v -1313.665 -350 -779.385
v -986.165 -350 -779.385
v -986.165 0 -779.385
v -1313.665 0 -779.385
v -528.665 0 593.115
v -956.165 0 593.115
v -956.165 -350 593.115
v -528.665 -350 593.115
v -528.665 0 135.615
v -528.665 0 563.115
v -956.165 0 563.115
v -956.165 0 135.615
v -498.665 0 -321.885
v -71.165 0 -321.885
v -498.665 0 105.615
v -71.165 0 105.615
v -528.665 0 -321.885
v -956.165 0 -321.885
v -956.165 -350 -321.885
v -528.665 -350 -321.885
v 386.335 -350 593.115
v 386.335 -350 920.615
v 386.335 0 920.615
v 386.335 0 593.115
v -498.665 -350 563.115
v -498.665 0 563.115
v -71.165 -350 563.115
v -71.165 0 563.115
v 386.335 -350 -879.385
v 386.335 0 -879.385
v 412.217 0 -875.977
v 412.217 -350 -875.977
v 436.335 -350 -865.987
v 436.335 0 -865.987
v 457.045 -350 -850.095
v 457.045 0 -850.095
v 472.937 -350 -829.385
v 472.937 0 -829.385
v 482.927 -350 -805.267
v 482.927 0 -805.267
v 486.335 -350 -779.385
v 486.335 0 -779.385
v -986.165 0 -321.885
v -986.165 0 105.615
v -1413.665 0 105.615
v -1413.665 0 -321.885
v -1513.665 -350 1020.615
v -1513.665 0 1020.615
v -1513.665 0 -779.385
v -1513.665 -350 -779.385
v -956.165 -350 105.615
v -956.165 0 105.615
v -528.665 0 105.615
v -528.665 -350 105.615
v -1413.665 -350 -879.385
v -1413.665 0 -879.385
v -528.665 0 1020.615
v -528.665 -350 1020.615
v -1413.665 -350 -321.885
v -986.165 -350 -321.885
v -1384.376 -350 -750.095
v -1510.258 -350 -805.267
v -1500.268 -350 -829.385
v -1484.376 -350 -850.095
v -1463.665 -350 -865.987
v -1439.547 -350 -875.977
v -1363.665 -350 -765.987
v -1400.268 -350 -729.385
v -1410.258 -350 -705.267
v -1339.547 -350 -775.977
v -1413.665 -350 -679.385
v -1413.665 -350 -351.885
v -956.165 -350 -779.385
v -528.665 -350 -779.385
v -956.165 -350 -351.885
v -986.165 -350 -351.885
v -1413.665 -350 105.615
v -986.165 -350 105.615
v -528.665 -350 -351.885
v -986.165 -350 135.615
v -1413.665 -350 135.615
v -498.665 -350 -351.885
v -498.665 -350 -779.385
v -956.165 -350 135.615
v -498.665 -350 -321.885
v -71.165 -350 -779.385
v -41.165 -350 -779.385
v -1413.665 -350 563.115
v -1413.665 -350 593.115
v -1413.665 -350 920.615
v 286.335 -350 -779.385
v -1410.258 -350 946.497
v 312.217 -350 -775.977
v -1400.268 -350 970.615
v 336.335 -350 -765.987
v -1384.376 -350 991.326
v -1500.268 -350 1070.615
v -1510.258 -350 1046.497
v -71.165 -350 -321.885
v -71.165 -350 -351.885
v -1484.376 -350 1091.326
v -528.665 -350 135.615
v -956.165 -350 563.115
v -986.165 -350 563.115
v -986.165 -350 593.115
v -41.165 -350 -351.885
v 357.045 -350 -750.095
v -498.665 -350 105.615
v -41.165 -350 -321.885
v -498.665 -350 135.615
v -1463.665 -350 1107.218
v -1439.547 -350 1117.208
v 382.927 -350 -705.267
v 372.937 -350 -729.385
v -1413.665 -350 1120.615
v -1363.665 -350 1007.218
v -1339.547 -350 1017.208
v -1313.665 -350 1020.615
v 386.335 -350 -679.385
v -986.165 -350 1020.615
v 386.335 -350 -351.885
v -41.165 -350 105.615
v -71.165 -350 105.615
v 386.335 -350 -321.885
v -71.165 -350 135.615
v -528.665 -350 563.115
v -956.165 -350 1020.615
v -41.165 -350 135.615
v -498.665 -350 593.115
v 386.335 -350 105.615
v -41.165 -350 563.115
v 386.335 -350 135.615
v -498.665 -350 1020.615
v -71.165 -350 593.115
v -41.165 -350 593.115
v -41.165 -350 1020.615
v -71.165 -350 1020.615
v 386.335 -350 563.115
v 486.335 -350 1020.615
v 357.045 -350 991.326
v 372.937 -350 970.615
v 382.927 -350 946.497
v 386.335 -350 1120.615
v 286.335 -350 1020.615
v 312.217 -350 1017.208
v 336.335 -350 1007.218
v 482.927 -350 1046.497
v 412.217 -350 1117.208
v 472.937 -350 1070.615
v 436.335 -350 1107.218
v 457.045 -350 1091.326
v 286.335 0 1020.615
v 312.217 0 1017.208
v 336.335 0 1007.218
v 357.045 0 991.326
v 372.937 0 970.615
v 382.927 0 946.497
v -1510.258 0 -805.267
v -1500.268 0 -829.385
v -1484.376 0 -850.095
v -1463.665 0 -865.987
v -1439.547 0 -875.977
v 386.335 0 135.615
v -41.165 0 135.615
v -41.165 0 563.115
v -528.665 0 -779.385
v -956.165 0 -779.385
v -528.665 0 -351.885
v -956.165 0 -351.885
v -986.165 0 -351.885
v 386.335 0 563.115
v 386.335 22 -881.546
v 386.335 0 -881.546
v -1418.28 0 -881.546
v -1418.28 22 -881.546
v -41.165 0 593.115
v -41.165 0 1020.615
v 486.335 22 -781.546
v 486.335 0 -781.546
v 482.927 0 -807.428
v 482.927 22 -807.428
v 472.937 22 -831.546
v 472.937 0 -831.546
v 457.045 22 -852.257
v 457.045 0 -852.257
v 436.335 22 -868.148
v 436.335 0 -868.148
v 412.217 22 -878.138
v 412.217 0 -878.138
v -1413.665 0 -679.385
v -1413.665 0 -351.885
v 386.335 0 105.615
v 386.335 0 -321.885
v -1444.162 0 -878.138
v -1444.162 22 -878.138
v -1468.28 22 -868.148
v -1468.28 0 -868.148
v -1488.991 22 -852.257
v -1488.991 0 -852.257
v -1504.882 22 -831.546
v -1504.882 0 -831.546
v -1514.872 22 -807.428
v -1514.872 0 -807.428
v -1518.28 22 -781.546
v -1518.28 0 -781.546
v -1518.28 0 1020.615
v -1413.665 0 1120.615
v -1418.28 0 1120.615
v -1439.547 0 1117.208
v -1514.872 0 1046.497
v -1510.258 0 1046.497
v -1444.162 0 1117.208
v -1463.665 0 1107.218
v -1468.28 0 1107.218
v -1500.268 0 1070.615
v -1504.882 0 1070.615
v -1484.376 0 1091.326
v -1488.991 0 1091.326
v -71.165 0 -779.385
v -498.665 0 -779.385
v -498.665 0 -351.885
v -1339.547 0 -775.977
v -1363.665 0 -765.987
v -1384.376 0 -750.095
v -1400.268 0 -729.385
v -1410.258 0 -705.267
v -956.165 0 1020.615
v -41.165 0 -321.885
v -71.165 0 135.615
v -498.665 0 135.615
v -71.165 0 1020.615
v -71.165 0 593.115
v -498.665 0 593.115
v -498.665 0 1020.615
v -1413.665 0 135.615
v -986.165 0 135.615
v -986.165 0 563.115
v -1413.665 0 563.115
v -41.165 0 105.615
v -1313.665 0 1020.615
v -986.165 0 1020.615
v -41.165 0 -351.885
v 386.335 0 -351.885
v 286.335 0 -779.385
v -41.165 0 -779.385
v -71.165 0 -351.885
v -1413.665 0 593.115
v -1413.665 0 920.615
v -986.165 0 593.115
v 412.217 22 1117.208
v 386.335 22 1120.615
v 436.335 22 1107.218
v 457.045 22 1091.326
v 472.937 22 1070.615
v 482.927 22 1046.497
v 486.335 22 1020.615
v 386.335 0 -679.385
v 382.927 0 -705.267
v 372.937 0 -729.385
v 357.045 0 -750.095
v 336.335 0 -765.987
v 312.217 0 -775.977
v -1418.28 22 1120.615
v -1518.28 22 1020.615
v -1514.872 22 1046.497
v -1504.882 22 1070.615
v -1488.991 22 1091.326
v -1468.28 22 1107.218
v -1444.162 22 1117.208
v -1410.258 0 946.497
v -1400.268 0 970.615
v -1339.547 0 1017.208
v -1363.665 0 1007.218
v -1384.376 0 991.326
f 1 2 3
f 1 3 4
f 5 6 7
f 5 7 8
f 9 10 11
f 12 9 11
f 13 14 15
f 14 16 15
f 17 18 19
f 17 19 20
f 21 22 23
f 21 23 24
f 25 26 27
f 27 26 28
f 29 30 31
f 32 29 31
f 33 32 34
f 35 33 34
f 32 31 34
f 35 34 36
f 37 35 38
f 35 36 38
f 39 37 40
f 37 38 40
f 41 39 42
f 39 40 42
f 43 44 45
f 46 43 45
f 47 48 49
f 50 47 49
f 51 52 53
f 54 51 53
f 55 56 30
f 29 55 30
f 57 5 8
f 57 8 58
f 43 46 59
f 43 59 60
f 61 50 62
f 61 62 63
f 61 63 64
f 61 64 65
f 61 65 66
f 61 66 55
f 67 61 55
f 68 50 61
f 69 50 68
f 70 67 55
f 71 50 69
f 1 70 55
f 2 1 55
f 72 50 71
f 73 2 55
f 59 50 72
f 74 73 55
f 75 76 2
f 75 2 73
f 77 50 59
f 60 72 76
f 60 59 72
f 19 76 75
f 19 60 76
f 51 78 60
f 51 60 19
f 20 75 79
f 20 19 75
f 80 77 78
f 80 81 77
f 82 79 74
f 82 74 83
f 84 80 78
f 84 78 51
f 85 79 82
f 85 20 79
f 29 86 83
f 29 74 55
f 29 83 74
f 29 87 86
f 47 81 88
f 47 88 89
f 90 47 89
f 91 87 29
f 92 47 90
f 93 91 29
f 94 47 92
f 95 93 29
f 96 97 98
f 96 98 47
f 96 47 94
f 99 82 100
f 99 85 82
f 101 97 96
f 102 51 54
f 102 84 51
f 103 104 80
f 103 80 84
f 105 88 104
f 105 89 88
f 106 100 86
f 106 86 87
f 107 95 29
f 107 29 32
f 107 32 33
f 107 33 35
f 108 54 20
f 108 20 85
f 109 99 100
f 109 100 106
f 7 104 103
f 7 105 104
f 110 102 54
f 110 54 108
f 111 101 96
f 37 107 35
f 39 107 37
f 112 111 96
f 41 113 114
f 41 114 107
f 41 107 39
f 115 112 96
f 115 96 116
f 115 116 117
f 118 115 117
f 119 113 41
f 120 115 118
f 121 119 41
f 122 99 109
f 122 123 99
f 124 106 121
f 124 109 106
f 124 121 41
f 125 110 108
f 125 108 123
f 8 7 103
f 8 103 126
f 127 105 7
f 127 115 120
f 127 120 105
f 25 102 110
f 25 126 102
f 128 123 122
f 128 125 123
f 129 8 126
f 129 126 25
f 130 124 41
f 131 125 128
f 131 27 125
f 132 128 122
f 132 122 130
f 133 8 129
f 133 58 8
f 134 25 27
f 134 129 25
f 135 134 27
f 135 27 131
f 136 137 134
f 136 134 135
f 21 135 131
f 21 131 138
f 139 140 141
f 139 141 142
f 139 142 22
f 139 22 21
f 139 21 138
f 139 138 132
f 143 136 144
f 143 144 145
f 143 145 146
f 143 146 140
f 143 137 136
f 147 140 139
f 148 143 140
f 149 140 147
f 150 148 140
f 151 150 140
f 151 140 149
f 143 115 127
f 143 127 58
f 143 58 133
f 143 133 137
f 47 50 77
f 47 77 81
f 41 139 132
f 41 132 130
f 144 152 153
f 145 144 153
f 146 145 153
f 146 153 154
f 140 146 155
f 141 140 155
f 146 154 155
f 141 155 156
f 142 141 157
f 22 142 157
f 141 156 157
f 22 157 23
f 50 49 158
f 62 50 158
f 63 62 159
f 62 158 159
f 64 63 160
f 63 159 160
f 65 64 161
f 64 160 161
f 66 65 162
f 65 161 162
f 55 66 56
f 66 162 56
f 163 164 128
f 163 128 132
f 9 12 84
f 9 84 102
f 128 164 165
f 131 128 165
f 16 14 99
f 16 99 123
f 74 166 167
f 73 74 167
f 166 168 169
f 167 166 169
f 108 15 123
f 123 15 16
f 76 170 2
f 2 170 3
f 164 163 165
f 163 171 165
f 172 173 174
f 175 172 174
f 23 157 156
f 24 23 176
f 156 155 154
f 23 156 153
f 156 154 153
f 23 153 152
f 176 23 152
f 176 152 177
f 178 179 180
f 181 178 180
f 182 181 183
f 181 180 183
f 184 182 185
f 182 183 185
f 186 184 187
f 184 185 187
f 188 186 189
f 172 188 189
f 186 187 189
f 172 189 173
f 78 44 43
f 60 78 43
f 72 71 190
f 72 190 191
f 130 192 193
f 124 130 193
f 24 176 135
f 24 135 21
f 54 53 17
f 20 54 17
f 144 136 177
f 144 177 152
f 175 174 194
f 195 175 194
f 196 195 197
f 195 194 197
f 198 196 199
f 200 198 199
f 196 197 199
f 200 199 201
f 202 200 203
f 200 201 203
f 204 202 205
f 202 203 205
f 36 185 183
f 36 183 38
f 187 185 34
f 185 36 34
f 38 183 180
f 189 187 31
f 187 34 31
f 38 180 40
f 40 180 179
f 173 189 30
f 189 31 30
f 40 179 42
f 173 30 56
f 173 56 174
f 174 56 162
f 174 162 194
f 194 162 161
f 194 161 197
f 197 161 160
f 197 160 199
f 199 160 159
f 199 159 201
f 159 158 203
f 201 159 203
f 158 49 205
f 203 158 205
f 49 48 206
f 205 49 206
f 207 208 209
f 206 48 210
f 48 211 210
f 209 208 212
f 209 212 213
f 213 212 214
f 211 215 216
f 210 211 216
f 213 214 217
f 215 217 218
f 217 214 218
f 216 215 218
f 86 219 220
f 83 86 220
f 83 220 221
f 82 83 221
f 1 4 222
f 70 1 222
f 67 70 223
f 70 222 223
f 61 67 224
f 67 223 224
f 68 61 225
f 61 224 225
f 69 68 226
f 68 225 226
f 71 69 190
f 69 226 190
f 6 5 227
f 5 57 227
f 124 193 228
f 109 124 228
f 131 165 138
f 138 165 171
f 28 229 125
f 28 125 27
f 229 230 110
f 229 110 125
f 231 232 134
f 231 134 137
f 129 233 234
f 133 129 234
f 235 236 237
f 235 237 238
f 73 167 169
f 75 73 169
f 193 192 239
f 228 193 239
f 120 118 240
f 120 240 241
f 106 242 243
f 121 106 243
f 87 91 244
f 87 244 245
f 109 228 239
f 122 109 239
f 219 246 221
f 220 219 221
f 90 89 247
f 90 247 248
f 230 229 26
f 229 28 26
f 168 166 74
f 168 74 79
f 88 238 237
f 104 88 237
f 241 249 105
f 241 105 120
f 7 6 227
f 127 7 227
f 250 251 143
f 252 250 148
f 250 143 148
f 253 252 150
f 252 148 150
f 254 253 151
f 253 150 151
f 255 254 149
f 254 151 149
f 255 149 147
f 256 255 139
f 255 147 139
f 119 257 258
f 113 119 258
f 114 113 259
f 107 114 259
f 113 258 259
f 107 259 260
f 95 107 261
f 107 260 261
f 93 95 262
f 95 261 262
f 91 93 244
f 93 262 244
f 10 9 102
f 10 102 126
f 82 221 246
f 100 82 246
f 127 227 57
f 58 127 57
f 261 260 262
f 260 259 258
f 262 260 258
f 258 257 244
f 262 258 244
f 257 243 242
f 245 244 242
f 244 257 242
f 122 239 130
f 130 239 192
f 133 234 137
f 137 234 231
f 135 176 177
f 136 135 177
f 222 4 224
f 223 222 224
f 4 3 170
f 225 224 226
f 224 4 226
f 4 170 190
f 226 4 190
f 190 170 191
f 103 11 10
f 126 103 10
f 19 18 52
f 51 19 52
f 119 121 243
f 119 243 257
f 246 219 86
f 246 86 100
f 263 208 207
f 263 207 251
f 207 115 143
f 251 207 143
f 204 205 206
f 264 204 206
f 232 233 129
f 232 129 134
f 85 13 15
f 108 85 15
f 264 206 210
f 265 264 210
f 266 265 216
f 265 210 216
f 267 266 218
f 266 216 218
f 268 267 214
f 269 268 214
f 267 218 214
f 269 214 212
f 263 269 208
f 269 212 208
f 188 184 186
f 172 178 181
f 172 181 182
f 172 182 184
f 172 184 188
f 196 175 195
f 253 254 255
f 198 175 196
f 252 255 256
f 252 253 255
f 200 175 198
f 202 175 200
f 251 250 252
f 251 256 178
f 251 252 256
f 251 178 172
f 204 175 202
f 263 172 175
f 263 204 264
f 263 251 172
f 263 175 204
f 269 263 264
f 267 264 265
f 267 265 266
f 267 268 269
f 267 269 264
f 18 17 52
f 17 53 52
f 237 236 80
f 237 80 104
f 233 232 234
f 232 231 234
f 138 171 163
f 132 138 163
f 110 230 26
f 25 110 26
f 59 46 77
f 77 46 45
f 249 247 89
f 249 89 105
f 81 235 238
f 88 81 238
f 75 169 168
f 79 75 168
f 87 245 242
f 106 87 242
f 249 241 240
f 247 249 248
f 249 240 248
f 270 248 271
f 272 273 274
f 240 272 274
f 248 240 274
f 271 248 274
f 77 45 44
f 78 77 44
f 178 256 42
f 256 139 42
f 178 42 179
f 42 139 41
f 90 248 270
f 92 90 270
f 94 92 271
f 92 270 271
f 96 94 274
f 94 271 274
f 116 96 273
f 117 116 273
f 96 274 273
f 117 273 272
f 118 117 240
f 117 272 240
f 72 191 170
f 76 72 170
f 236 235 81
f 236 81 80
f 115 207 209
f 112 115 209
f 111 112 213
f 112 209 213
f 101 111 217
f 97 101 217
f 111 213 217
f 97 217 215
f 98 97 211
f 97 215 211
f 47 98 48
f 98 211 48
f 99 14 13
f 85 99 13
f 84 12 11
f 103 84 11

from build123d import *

# Parameters (mm, degrees)
F0_W     = 427.5
F0_H     = 30
F0_W_2   = 30
F0_H_2   = 427.5
F1_DEPTH = 350
F3_DEPTH = 22


with BuildPart() as f1:
    # F0 (on Front) → F1 (new body)
    with BuildSketch(Plane.XZ):
        with BuildLine():
            Line((386.3346025348, 1120.6153738732), (-1413.6653974652, 1120.6153738732))
            ThreePointArc((-1413.6653974652, 1120.6153738732), (-1484.3760755839, 1091.3260519918), (-1513.6653974652, 1020.6153738732))
            Line((-1513.6653974652, 1020.6153738732), (-1513.6653974652, -779.3846261268))
            ThreePointArc((-1513.6653974652, -779.3846261268), (-1484.3760755839, -850.0953042455), (-1413.6653974652, -879.3846261268))
            Line((-1413.6653974652, -879.3846261268), (386.3346025348, -879.3846261268))
            ThreePointArc((386.3346025348, -879.3846261268), (457.0452806534, -850.0953042455), (486.3346025348, -779.3846261268))
            Line((486.3346025348, -779.3846261268), (486.3346025348, 1020.6153738732))
            ThreePointArc((486.3346025348, 1020.6153738732), (457.0452806534, 1091.3260519918), (386.3346025348, 1120.6153738732))
        make_face()
        with BuildLine():
            ThreePointArc((-1413.6653974652, 920.6153738732), (-1384.3760755839, 991.3260519918), (-1313.6653974652, 1020.6153738732))
            Line((-1313.6653974652, 1020.6153738732), (-986.1653974652, 1020.6153738732))
            Line((-986.1653974652, 1020.6153738732), (-956.1653974652, 1020.6153738732))
            Line((-956.1653974652, 1020.6153738732), (-528.6653974652, 1020.6153738732))
            Line((-528.6653974652, 1020.6153738732), (-498.6653974652, 1020.6153738732))
            Line((-498.6653974652, 1020.6153738732), (-71.1653974652, 1020.6153738732))
            Line((-71.1653974652, 1020.6153738732), (-41.1653974652, 1020.6153738732))
            Line((-41.1653974652, 1020.6153738732), (286.3346025348, 1020.6153738732))
            ThreePointArc((286.3346025348, 1020.6153738732), (357.0452806534, 991.3260519918), (386.3346025348, 920.6153738732))
            Line((386.3346025348, 920.6153738732), (386.3346025348, 593.1153738732))
            Line((386.3346025348, 593.1153738732), (386.3346025348, 563.1153738732))
            Line((386.3346025348, 563.1153738732), (386.3346025348, 135.6153738732))
            Line((386.3346025348, 135.6153738732), (386.3346025348, 105.6153738732))
            Line((386.3346025348, 105.6153738732), (386.3346025348, -321.8846261268))
            Line((386.3346025348, -321.8846261268), (386.3346025348, -351.8846261268))
            Line((386.3346025348, -351.8846261268), (386.3346025348, -679.3846261268))
            ThreePointArc((386.3346025348, -679.3846261268), (357.0452806534, -750.0953042455), (286.3346025348, -779.3846261268))
            Line((286.3346025348, -779.3846261268), (-41.1653974652, -779.3846261268))
            Line((-41.1653974652, -779.3846261268), (-71.1653974652, -779.3846261268))
            Line((-71.1653974652, -779.3846261268), (-498.6653974652, -779.3846261268))
            Line((-498.6653974652, -779.3846261268), (-528.6653974652, -779.3846261268))
            Line((-528.6653974652, -779.3846261268), (-956.1653974652, -779.3846261268))
            Line((-956.1653974652, -779.3846261268), (-986.1653974652, -779.3846261268))
            Line((-986.1653974652, -779.3846261268), (-1313.6653974652, -779.3846261268))
            ThreePointArc((-1313.6653974652, -779.3846261268), (-1384.3760755839, -750.0953042455), (-1413.6653974652, -679.3846261268))
            Line((-1413.6653974652, -679.3846261268), (-1413.6653974652, -351.8846261268))
            Line((-1413.6653974652, -351.8846261268), (-1413.6653974652, -321.8846261268))
            Line((-1413.6653974652, -321.8846261268), (-1413.6653974652, 105.6153738732))
            Line((-1413.6653974652, 105.6153738732), (-1413.6653974652, 135.6153738732))
            Line((-1413.6653974652, 135.6153738732), (-1413.6653974652, 563.1153738732))
            Line((-1413.6653974652, 563.1153738732), (-1413.6653974652, 593.1153738732))
            Line((-1413.6653974652, 593.1153738732), (-1413.6653974652, 920.6153738732))
        make_face(mode=Mode.SUBTRACT)
        with Locations((-742.4153974652, 578.1153738732)):
            Rectangle(F0_W, F0_H)
        with Locations((-1199.9153974652, 578.1153738732)):
            Rectangle(F0_W, F0_H)
        with Locations((-971.1653974652, 806.8653738732)):
            Rectangle(F0_W_2, F0_H_2)
        with Locations((-971.1653974652, 578.1153738732)):
            Rectangle(F0_W_2, F0_H)
        with Locations((-513.6653974652, 806.8653738732)):
            Rectangle(F0_W_2, F0_H_2)
        with Locations((-513.6653974652, 578.1153738732)):
            Rectangle(F0_W_2, F0_H)
        with Locations((-284.9153974652, 578.1153738732)):
            Rectangle(F0_W, F0_H)
        with Locations((-56.1653974652, 806.8653738732)):
            Rectangle(F0_W_2, F0_H_2)
        with Locations((-56.1653974652, 578.1153738732)):
            Rectangle(F0_W_2, F0_H)
        with Locations((172.5846025348, 578.1153738732)):
            Rectangle(F0_W, F0_H)
        with Locations((-56.1653974652, 349.3653738732)):
            Rectangle(F0_W_2, F0_H_2)
        with Locations((-513.6653974652, 349.3653738732)):
            Rectangle(F0_W_2, F0_H_2)
        with Locations((-971.1653974652, 349.3653738732)):
            Rectangle(F0_W_2, F0_H_2)
        with Locations((-1199.9153974652, 120.6153738732)):
            Rectangle(F0_W, F0_H)
        with Locations((-971.1653974652, 120.6153738732)):
            Rectangle(F0_W_2, F0_H)
        with Locations((-742.4153974652, 120.6153738732)):
            Rectangle(F0_W, F0_H)
        with Locations((-284.9153974652, 120.6153738732)):
            Rectangle(F0_W, F0_H)
        with Locations((-513.6653974652, 120.6153738732)):
            Rectangle(F0_W_2, F0_H)
        with Locations((-56.1653974652, 120.6153738732)):
            Rectangle(F0_W_2, F0_H)
        with Locations((172.5846025348, 120.6153738732)):
            Rectangle(F0_W, F0_H)
        with Locations((-56.1653974652, -336.8846261268)):
            Rectangle(F0_W_2, F0_H)
        with Locations((-513.6653974652, -336.8846261268)):
            Rectangle(F0_W_2, F0_H)
        with Locations((-971.1653974652, -336.8846261268)):
            Rectangle(F0_W_2, F0_H)
        with Locations((-971.1653974652, -108.1346261268)):
            Rectangle(F0_W_2, F0_H_2)
        with Locations((-513.6653974652, -108.1346261268)):
            Rectangle(F0_W_2, F0_H_2)
        with Locations((-742.4153974652, -336.8846261268)):
            Rectangle(F0_W, F0_H)
        with Locations((-284.9153974652, -336.8846261268)):
            Rectangle(F0_W, F0_H)
        with Locations((172.5846025348, -336.8846261268)):
            Rectangle(F0_W, F0_H)
        with Locations((-56.1653974652, -108.1346261268)):
            Rectangle(F0_W_2, F0_H_2)
        with Locations((-56.1653974652, -565.6346261268)):
            Rectangle(F0_W_2, F0_H_2)
        with Locations((-513.6653974652, -565.6346261268)):
            Rectangle(F0_W_2, F0_H_2)
        with Locations((-971.1653974652, -565.6346261268)):
            Rectangle(F0_W_2, F0_H_2)
        with Locations((-1199.9153974652, -336.8846261268)):
            Rectangle(F0_W, F0_H)
    extrude(amount=F1_DEPTH)

    # F2 (on face) → F3 (join)
    with BuildSketch(Plane(origin=(0, 0, 0), x_dir=(-1, 0, 0), z_dir=(0, 1, 0))):
        with BuildLine():
            Line((1418.2799100876, 1120.6153738732), (-386.3346025348, 1120.6153738732))
            ThreePointArc((-386.3346025348, 1120.6153738732), (-457.0452806534, 1091.3260519918), (-486.3346025348, 1020.6153738732))
            Line((-486.3346025348, 1020.6153738732), (-486.3346025348, -781.5458416939))
            ThreePointArc((-486.3346025348, -781.5458416939), (-457.0452806534, -852.2565198125), (-386.3346025348, -881.5458416939))
            Line((-386.3346025348, -881.5458416939), (1418.2799100876, -881.5458416939))
            ThreePointArc((1418.2799100876, -881.5458416939), (1488.9905882062, -852.2565198125), (1518.2799100876, -781.5458416939))
            Line((1518.2799100876, -781.5458416939), (1518.2799100876, 1020.6153738732))
            ThreePointArc((1518.2799100876, 1020.6153738732), (1488.9905882062, 1091.3260519918), (1418.2799100876, 1120.6153738732))
        make_face()
    extrude(amount=F3_DEPTH)


solid = f1.part
